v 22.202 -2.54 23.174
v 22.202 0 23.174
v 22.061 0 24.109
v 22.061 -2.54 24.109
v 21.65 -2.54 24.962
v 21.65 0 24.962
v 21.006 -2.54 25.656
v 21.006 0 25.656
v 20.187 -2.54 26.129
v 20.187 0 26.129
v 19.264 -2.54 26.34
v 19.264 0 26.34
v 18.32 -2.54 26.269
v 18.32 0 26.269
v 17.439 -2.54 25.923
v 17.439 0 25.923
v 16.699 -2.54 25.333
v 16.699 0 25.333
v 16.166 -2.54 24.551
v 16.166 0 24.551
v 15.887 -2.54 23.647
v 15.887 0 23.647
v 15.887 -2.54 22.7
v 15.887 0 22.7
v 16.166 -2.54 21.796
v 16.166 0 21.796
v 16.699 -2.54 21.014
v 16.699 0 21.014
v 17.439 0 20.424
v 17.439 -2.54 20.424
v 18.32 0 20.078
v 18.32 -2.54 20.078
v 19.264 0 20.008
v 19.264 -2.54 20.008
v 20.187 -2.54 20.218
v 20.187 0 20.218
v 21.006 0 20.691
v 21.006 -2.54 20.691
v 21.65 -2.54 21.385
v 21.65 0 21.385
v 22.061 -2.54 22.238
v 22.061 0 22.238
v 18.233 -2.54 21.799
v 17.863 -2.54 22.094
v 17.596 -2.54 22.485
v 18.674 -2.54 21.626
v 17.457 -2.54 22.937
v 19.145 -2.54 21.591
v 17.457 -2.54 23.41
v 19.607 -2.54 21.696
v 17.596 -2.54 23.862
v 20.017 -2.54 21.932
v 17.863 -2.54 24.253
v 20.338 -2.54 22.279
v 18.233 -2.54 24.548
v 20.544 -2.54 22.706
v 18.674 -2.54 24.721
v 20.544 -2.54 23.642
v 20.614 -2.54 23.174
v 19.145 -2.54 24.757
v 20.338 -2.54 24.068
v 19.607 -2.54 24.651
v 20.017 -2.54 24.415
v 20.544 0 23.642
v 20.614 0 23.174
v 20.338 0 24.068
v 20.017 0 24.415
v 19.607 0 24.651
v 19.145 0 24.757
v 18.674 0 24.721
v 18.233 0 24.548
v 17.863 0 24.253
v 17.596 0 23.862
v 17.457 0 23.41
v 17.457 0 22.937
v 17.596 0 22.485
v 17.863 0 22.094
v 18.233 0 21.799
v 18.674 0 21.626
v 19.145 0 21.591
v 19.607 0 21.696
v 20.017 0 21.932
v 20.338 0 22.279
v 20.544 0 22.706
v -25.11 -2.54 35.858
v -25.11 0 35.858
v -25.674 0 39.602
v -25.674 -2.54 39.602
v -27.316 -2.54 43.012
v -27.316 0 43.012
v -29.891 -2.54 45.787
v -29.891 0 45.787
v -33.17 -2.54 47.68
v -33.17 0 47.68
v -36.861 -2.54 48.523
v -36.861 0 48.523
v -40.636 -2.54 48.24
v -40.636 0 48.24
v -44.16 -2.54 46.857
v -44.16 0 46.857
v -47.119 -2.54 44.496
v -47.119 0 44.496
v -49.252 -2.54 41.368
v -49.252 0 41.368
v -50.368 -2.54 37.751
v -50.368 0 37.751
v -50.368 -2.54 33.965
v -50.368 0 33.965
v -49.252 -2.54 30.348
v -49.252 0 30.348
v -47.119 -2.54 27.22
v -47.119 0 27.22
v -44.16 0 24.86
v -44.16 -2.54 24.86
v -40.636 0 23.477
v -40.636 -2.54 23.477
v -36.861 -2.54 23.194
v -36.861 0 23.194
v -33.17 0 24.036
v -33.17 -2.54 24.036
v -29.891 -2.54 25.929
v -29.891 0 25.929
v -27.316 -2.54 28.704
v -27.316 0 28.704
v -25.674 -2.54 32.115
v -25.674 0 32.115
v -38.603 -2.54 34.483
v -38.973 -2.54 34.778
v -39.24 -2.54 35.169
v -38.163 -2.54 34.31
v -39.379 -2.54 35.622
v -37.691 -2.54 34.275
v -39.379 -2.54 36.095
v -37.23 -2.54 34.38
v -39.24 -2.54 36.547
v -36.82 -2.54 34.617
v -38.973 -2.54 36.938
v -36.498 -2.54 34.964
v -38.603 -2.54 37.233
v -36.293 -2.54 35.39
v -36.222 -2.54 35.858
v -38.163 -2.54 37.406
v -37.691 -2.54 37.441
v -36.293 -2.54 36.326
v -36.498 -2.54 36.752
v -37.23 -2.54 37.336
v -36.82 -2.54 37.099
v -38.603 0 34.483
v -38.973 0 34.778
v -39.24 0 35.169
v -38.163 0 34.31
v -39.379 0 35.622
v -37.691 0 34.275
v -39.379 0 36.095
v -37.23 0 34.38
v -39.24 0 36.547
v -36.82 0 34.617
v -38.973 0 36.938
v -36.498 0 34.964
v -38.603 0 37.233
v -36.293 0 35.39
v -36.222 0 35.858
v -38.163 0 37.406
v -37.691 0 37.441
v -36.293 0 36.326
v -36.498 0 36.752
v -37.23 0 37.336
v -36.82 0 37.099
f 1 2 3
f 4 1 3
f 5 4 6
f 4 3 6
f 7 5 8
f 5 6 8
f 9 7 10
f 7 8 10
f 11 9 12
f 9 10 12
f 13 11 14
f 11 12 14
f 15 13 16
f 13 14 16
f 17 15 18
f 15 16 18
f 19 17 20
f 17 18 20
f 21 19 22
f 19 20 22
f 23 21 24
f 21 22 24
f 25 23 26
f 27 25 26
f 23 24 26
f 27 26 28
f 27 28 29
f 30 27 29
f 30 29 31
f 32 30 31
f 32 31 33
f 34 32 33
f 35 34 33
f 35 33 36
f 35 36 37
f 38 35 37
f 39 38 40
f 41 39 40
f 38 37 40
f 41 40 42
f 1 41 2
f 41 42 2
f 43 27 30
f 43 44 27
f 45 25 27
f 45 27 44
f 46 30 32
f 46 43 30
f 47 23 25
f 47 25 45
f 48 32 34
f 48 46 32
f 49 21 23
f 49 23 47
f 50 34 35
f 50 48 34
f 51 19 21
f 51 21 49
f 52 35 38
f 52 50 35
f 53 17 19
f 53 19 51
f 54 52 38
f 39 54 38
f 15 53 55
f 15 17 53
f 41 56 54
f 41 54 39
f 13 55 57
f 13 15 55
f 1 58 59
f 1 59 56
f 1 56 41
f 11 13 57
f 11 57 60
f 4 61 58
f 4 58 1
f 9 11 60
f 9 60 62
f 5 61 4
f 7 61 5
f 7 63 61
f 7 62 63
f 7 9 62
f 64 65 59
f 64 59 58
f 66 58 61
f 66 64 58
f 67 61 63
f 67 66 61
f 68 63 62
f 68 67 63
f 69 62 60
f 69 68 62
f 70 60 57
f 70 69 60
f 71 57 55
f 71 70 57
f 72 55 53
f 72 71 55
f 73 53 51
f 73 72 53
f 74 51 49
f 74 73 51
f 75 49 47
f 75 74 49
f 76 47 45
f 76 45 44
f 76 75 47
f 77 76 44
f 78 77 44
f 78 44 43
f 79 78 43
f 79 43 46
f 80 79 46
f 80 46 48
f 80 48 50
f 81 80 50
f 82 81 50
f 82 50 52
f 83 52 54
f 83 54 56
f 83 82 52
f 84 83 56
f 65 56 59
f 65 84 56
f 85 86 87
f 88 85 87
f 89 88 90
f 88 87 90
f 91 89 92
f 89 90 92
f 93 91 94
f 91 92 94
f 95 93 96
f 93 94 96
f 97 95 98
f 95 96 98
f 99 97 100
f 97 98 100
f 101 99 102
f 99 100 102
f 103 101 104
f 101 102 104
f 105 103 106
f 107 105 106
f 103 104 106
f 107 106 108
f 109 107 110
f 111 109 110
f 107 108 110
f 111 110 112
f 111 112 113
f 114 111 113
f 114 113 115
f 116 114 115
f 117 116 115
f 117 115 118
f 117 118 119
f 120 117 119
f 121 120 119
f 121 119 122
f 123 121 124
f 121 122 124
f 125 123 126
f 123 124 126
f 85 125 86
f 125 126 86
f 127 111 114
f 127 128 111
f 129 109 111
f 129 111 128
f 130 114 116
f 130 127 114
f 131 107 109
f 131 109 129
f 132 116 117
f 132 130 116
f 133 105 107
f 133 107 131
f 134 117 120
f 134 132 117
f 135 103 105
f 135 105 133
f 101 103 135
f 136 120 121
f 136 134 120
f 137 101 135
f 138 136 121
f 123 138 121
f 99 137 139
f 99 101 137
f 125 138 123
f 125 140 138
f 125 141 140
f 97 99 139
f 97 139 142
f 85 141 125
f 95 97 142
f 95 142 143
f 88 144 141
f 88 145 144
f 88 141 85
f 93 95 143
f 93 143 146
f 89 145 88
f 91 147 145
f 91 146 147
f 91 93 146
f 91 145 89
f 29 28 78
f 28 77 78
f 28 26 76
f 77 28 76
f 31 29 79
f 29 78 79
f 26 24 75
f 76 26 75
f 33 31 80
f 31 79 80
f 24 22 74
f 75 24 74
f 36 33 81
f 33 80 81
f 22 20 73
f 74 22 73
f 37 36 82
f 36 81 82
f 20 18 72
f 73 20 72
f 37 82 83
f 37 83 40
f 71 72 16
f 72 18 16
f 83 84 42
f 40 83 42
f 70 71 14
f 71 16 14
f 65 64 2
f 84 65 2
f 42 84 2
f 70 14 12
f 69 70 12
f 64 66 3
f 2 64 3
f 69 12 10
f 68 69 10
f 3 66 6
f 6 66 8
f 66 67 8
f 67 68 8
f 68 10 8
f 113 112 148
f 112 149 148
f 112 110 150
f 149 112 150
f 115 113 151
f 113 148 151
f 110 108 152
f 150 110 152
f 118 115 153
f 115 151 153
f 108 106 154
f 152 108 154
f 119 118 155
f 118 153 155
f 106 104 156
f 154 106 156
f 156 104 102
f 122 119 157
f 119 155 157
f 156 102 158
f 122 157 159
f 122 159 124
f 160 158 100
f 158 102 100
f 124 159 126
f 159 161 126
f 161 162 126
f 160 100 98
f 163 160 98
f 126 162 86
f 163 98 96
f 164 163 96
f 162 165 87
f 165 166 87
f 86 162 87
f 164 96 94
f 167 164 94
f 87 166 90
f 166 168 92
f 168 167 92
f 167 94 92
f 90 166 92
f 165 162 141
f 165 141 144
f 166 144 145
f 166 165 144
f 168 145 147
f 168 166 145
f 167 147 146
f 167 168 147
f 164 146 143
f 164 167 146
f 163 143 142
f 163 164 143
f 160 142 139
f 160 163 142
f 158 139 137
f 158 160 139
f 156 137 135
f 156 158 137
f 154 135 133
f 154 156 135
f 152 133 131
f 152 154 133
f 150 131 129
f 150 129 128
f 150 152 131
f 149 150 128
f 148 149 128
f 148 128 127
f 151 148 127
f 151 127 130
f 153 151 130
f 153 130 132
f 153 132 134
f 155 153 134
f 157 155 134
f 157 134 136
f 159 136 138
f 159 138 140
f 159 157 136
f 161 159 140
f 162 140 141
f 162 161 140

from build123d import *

# Parameters (mm, degrees)
F0_R     = 12.7
F0_R_2   = 1.5875
F0_R_3   = 3.175
F1_DEPTH = 2.54


with BuildPart() as f1:
    # F0 (on Front) → F1 (new body)
    with BuildSketch(Plane.XZ):
        with Locations((-37.809603, 35.858139)):
            Circle(F0_R)
        with Locations((-37.809603, 35.858139)):
            Circle(F0_R_2, mode=Mode.SUBTRACT)
        with Locations((19.026769, 23.173628)):
            Circle(F0_R_3)
        with Locations((19.026769, 23.173628)):
            Circle(F0_R_2, mode=Mode.SUBTRACT)
    extrude(amount=F1_DEPTH)


solid = f1.part
